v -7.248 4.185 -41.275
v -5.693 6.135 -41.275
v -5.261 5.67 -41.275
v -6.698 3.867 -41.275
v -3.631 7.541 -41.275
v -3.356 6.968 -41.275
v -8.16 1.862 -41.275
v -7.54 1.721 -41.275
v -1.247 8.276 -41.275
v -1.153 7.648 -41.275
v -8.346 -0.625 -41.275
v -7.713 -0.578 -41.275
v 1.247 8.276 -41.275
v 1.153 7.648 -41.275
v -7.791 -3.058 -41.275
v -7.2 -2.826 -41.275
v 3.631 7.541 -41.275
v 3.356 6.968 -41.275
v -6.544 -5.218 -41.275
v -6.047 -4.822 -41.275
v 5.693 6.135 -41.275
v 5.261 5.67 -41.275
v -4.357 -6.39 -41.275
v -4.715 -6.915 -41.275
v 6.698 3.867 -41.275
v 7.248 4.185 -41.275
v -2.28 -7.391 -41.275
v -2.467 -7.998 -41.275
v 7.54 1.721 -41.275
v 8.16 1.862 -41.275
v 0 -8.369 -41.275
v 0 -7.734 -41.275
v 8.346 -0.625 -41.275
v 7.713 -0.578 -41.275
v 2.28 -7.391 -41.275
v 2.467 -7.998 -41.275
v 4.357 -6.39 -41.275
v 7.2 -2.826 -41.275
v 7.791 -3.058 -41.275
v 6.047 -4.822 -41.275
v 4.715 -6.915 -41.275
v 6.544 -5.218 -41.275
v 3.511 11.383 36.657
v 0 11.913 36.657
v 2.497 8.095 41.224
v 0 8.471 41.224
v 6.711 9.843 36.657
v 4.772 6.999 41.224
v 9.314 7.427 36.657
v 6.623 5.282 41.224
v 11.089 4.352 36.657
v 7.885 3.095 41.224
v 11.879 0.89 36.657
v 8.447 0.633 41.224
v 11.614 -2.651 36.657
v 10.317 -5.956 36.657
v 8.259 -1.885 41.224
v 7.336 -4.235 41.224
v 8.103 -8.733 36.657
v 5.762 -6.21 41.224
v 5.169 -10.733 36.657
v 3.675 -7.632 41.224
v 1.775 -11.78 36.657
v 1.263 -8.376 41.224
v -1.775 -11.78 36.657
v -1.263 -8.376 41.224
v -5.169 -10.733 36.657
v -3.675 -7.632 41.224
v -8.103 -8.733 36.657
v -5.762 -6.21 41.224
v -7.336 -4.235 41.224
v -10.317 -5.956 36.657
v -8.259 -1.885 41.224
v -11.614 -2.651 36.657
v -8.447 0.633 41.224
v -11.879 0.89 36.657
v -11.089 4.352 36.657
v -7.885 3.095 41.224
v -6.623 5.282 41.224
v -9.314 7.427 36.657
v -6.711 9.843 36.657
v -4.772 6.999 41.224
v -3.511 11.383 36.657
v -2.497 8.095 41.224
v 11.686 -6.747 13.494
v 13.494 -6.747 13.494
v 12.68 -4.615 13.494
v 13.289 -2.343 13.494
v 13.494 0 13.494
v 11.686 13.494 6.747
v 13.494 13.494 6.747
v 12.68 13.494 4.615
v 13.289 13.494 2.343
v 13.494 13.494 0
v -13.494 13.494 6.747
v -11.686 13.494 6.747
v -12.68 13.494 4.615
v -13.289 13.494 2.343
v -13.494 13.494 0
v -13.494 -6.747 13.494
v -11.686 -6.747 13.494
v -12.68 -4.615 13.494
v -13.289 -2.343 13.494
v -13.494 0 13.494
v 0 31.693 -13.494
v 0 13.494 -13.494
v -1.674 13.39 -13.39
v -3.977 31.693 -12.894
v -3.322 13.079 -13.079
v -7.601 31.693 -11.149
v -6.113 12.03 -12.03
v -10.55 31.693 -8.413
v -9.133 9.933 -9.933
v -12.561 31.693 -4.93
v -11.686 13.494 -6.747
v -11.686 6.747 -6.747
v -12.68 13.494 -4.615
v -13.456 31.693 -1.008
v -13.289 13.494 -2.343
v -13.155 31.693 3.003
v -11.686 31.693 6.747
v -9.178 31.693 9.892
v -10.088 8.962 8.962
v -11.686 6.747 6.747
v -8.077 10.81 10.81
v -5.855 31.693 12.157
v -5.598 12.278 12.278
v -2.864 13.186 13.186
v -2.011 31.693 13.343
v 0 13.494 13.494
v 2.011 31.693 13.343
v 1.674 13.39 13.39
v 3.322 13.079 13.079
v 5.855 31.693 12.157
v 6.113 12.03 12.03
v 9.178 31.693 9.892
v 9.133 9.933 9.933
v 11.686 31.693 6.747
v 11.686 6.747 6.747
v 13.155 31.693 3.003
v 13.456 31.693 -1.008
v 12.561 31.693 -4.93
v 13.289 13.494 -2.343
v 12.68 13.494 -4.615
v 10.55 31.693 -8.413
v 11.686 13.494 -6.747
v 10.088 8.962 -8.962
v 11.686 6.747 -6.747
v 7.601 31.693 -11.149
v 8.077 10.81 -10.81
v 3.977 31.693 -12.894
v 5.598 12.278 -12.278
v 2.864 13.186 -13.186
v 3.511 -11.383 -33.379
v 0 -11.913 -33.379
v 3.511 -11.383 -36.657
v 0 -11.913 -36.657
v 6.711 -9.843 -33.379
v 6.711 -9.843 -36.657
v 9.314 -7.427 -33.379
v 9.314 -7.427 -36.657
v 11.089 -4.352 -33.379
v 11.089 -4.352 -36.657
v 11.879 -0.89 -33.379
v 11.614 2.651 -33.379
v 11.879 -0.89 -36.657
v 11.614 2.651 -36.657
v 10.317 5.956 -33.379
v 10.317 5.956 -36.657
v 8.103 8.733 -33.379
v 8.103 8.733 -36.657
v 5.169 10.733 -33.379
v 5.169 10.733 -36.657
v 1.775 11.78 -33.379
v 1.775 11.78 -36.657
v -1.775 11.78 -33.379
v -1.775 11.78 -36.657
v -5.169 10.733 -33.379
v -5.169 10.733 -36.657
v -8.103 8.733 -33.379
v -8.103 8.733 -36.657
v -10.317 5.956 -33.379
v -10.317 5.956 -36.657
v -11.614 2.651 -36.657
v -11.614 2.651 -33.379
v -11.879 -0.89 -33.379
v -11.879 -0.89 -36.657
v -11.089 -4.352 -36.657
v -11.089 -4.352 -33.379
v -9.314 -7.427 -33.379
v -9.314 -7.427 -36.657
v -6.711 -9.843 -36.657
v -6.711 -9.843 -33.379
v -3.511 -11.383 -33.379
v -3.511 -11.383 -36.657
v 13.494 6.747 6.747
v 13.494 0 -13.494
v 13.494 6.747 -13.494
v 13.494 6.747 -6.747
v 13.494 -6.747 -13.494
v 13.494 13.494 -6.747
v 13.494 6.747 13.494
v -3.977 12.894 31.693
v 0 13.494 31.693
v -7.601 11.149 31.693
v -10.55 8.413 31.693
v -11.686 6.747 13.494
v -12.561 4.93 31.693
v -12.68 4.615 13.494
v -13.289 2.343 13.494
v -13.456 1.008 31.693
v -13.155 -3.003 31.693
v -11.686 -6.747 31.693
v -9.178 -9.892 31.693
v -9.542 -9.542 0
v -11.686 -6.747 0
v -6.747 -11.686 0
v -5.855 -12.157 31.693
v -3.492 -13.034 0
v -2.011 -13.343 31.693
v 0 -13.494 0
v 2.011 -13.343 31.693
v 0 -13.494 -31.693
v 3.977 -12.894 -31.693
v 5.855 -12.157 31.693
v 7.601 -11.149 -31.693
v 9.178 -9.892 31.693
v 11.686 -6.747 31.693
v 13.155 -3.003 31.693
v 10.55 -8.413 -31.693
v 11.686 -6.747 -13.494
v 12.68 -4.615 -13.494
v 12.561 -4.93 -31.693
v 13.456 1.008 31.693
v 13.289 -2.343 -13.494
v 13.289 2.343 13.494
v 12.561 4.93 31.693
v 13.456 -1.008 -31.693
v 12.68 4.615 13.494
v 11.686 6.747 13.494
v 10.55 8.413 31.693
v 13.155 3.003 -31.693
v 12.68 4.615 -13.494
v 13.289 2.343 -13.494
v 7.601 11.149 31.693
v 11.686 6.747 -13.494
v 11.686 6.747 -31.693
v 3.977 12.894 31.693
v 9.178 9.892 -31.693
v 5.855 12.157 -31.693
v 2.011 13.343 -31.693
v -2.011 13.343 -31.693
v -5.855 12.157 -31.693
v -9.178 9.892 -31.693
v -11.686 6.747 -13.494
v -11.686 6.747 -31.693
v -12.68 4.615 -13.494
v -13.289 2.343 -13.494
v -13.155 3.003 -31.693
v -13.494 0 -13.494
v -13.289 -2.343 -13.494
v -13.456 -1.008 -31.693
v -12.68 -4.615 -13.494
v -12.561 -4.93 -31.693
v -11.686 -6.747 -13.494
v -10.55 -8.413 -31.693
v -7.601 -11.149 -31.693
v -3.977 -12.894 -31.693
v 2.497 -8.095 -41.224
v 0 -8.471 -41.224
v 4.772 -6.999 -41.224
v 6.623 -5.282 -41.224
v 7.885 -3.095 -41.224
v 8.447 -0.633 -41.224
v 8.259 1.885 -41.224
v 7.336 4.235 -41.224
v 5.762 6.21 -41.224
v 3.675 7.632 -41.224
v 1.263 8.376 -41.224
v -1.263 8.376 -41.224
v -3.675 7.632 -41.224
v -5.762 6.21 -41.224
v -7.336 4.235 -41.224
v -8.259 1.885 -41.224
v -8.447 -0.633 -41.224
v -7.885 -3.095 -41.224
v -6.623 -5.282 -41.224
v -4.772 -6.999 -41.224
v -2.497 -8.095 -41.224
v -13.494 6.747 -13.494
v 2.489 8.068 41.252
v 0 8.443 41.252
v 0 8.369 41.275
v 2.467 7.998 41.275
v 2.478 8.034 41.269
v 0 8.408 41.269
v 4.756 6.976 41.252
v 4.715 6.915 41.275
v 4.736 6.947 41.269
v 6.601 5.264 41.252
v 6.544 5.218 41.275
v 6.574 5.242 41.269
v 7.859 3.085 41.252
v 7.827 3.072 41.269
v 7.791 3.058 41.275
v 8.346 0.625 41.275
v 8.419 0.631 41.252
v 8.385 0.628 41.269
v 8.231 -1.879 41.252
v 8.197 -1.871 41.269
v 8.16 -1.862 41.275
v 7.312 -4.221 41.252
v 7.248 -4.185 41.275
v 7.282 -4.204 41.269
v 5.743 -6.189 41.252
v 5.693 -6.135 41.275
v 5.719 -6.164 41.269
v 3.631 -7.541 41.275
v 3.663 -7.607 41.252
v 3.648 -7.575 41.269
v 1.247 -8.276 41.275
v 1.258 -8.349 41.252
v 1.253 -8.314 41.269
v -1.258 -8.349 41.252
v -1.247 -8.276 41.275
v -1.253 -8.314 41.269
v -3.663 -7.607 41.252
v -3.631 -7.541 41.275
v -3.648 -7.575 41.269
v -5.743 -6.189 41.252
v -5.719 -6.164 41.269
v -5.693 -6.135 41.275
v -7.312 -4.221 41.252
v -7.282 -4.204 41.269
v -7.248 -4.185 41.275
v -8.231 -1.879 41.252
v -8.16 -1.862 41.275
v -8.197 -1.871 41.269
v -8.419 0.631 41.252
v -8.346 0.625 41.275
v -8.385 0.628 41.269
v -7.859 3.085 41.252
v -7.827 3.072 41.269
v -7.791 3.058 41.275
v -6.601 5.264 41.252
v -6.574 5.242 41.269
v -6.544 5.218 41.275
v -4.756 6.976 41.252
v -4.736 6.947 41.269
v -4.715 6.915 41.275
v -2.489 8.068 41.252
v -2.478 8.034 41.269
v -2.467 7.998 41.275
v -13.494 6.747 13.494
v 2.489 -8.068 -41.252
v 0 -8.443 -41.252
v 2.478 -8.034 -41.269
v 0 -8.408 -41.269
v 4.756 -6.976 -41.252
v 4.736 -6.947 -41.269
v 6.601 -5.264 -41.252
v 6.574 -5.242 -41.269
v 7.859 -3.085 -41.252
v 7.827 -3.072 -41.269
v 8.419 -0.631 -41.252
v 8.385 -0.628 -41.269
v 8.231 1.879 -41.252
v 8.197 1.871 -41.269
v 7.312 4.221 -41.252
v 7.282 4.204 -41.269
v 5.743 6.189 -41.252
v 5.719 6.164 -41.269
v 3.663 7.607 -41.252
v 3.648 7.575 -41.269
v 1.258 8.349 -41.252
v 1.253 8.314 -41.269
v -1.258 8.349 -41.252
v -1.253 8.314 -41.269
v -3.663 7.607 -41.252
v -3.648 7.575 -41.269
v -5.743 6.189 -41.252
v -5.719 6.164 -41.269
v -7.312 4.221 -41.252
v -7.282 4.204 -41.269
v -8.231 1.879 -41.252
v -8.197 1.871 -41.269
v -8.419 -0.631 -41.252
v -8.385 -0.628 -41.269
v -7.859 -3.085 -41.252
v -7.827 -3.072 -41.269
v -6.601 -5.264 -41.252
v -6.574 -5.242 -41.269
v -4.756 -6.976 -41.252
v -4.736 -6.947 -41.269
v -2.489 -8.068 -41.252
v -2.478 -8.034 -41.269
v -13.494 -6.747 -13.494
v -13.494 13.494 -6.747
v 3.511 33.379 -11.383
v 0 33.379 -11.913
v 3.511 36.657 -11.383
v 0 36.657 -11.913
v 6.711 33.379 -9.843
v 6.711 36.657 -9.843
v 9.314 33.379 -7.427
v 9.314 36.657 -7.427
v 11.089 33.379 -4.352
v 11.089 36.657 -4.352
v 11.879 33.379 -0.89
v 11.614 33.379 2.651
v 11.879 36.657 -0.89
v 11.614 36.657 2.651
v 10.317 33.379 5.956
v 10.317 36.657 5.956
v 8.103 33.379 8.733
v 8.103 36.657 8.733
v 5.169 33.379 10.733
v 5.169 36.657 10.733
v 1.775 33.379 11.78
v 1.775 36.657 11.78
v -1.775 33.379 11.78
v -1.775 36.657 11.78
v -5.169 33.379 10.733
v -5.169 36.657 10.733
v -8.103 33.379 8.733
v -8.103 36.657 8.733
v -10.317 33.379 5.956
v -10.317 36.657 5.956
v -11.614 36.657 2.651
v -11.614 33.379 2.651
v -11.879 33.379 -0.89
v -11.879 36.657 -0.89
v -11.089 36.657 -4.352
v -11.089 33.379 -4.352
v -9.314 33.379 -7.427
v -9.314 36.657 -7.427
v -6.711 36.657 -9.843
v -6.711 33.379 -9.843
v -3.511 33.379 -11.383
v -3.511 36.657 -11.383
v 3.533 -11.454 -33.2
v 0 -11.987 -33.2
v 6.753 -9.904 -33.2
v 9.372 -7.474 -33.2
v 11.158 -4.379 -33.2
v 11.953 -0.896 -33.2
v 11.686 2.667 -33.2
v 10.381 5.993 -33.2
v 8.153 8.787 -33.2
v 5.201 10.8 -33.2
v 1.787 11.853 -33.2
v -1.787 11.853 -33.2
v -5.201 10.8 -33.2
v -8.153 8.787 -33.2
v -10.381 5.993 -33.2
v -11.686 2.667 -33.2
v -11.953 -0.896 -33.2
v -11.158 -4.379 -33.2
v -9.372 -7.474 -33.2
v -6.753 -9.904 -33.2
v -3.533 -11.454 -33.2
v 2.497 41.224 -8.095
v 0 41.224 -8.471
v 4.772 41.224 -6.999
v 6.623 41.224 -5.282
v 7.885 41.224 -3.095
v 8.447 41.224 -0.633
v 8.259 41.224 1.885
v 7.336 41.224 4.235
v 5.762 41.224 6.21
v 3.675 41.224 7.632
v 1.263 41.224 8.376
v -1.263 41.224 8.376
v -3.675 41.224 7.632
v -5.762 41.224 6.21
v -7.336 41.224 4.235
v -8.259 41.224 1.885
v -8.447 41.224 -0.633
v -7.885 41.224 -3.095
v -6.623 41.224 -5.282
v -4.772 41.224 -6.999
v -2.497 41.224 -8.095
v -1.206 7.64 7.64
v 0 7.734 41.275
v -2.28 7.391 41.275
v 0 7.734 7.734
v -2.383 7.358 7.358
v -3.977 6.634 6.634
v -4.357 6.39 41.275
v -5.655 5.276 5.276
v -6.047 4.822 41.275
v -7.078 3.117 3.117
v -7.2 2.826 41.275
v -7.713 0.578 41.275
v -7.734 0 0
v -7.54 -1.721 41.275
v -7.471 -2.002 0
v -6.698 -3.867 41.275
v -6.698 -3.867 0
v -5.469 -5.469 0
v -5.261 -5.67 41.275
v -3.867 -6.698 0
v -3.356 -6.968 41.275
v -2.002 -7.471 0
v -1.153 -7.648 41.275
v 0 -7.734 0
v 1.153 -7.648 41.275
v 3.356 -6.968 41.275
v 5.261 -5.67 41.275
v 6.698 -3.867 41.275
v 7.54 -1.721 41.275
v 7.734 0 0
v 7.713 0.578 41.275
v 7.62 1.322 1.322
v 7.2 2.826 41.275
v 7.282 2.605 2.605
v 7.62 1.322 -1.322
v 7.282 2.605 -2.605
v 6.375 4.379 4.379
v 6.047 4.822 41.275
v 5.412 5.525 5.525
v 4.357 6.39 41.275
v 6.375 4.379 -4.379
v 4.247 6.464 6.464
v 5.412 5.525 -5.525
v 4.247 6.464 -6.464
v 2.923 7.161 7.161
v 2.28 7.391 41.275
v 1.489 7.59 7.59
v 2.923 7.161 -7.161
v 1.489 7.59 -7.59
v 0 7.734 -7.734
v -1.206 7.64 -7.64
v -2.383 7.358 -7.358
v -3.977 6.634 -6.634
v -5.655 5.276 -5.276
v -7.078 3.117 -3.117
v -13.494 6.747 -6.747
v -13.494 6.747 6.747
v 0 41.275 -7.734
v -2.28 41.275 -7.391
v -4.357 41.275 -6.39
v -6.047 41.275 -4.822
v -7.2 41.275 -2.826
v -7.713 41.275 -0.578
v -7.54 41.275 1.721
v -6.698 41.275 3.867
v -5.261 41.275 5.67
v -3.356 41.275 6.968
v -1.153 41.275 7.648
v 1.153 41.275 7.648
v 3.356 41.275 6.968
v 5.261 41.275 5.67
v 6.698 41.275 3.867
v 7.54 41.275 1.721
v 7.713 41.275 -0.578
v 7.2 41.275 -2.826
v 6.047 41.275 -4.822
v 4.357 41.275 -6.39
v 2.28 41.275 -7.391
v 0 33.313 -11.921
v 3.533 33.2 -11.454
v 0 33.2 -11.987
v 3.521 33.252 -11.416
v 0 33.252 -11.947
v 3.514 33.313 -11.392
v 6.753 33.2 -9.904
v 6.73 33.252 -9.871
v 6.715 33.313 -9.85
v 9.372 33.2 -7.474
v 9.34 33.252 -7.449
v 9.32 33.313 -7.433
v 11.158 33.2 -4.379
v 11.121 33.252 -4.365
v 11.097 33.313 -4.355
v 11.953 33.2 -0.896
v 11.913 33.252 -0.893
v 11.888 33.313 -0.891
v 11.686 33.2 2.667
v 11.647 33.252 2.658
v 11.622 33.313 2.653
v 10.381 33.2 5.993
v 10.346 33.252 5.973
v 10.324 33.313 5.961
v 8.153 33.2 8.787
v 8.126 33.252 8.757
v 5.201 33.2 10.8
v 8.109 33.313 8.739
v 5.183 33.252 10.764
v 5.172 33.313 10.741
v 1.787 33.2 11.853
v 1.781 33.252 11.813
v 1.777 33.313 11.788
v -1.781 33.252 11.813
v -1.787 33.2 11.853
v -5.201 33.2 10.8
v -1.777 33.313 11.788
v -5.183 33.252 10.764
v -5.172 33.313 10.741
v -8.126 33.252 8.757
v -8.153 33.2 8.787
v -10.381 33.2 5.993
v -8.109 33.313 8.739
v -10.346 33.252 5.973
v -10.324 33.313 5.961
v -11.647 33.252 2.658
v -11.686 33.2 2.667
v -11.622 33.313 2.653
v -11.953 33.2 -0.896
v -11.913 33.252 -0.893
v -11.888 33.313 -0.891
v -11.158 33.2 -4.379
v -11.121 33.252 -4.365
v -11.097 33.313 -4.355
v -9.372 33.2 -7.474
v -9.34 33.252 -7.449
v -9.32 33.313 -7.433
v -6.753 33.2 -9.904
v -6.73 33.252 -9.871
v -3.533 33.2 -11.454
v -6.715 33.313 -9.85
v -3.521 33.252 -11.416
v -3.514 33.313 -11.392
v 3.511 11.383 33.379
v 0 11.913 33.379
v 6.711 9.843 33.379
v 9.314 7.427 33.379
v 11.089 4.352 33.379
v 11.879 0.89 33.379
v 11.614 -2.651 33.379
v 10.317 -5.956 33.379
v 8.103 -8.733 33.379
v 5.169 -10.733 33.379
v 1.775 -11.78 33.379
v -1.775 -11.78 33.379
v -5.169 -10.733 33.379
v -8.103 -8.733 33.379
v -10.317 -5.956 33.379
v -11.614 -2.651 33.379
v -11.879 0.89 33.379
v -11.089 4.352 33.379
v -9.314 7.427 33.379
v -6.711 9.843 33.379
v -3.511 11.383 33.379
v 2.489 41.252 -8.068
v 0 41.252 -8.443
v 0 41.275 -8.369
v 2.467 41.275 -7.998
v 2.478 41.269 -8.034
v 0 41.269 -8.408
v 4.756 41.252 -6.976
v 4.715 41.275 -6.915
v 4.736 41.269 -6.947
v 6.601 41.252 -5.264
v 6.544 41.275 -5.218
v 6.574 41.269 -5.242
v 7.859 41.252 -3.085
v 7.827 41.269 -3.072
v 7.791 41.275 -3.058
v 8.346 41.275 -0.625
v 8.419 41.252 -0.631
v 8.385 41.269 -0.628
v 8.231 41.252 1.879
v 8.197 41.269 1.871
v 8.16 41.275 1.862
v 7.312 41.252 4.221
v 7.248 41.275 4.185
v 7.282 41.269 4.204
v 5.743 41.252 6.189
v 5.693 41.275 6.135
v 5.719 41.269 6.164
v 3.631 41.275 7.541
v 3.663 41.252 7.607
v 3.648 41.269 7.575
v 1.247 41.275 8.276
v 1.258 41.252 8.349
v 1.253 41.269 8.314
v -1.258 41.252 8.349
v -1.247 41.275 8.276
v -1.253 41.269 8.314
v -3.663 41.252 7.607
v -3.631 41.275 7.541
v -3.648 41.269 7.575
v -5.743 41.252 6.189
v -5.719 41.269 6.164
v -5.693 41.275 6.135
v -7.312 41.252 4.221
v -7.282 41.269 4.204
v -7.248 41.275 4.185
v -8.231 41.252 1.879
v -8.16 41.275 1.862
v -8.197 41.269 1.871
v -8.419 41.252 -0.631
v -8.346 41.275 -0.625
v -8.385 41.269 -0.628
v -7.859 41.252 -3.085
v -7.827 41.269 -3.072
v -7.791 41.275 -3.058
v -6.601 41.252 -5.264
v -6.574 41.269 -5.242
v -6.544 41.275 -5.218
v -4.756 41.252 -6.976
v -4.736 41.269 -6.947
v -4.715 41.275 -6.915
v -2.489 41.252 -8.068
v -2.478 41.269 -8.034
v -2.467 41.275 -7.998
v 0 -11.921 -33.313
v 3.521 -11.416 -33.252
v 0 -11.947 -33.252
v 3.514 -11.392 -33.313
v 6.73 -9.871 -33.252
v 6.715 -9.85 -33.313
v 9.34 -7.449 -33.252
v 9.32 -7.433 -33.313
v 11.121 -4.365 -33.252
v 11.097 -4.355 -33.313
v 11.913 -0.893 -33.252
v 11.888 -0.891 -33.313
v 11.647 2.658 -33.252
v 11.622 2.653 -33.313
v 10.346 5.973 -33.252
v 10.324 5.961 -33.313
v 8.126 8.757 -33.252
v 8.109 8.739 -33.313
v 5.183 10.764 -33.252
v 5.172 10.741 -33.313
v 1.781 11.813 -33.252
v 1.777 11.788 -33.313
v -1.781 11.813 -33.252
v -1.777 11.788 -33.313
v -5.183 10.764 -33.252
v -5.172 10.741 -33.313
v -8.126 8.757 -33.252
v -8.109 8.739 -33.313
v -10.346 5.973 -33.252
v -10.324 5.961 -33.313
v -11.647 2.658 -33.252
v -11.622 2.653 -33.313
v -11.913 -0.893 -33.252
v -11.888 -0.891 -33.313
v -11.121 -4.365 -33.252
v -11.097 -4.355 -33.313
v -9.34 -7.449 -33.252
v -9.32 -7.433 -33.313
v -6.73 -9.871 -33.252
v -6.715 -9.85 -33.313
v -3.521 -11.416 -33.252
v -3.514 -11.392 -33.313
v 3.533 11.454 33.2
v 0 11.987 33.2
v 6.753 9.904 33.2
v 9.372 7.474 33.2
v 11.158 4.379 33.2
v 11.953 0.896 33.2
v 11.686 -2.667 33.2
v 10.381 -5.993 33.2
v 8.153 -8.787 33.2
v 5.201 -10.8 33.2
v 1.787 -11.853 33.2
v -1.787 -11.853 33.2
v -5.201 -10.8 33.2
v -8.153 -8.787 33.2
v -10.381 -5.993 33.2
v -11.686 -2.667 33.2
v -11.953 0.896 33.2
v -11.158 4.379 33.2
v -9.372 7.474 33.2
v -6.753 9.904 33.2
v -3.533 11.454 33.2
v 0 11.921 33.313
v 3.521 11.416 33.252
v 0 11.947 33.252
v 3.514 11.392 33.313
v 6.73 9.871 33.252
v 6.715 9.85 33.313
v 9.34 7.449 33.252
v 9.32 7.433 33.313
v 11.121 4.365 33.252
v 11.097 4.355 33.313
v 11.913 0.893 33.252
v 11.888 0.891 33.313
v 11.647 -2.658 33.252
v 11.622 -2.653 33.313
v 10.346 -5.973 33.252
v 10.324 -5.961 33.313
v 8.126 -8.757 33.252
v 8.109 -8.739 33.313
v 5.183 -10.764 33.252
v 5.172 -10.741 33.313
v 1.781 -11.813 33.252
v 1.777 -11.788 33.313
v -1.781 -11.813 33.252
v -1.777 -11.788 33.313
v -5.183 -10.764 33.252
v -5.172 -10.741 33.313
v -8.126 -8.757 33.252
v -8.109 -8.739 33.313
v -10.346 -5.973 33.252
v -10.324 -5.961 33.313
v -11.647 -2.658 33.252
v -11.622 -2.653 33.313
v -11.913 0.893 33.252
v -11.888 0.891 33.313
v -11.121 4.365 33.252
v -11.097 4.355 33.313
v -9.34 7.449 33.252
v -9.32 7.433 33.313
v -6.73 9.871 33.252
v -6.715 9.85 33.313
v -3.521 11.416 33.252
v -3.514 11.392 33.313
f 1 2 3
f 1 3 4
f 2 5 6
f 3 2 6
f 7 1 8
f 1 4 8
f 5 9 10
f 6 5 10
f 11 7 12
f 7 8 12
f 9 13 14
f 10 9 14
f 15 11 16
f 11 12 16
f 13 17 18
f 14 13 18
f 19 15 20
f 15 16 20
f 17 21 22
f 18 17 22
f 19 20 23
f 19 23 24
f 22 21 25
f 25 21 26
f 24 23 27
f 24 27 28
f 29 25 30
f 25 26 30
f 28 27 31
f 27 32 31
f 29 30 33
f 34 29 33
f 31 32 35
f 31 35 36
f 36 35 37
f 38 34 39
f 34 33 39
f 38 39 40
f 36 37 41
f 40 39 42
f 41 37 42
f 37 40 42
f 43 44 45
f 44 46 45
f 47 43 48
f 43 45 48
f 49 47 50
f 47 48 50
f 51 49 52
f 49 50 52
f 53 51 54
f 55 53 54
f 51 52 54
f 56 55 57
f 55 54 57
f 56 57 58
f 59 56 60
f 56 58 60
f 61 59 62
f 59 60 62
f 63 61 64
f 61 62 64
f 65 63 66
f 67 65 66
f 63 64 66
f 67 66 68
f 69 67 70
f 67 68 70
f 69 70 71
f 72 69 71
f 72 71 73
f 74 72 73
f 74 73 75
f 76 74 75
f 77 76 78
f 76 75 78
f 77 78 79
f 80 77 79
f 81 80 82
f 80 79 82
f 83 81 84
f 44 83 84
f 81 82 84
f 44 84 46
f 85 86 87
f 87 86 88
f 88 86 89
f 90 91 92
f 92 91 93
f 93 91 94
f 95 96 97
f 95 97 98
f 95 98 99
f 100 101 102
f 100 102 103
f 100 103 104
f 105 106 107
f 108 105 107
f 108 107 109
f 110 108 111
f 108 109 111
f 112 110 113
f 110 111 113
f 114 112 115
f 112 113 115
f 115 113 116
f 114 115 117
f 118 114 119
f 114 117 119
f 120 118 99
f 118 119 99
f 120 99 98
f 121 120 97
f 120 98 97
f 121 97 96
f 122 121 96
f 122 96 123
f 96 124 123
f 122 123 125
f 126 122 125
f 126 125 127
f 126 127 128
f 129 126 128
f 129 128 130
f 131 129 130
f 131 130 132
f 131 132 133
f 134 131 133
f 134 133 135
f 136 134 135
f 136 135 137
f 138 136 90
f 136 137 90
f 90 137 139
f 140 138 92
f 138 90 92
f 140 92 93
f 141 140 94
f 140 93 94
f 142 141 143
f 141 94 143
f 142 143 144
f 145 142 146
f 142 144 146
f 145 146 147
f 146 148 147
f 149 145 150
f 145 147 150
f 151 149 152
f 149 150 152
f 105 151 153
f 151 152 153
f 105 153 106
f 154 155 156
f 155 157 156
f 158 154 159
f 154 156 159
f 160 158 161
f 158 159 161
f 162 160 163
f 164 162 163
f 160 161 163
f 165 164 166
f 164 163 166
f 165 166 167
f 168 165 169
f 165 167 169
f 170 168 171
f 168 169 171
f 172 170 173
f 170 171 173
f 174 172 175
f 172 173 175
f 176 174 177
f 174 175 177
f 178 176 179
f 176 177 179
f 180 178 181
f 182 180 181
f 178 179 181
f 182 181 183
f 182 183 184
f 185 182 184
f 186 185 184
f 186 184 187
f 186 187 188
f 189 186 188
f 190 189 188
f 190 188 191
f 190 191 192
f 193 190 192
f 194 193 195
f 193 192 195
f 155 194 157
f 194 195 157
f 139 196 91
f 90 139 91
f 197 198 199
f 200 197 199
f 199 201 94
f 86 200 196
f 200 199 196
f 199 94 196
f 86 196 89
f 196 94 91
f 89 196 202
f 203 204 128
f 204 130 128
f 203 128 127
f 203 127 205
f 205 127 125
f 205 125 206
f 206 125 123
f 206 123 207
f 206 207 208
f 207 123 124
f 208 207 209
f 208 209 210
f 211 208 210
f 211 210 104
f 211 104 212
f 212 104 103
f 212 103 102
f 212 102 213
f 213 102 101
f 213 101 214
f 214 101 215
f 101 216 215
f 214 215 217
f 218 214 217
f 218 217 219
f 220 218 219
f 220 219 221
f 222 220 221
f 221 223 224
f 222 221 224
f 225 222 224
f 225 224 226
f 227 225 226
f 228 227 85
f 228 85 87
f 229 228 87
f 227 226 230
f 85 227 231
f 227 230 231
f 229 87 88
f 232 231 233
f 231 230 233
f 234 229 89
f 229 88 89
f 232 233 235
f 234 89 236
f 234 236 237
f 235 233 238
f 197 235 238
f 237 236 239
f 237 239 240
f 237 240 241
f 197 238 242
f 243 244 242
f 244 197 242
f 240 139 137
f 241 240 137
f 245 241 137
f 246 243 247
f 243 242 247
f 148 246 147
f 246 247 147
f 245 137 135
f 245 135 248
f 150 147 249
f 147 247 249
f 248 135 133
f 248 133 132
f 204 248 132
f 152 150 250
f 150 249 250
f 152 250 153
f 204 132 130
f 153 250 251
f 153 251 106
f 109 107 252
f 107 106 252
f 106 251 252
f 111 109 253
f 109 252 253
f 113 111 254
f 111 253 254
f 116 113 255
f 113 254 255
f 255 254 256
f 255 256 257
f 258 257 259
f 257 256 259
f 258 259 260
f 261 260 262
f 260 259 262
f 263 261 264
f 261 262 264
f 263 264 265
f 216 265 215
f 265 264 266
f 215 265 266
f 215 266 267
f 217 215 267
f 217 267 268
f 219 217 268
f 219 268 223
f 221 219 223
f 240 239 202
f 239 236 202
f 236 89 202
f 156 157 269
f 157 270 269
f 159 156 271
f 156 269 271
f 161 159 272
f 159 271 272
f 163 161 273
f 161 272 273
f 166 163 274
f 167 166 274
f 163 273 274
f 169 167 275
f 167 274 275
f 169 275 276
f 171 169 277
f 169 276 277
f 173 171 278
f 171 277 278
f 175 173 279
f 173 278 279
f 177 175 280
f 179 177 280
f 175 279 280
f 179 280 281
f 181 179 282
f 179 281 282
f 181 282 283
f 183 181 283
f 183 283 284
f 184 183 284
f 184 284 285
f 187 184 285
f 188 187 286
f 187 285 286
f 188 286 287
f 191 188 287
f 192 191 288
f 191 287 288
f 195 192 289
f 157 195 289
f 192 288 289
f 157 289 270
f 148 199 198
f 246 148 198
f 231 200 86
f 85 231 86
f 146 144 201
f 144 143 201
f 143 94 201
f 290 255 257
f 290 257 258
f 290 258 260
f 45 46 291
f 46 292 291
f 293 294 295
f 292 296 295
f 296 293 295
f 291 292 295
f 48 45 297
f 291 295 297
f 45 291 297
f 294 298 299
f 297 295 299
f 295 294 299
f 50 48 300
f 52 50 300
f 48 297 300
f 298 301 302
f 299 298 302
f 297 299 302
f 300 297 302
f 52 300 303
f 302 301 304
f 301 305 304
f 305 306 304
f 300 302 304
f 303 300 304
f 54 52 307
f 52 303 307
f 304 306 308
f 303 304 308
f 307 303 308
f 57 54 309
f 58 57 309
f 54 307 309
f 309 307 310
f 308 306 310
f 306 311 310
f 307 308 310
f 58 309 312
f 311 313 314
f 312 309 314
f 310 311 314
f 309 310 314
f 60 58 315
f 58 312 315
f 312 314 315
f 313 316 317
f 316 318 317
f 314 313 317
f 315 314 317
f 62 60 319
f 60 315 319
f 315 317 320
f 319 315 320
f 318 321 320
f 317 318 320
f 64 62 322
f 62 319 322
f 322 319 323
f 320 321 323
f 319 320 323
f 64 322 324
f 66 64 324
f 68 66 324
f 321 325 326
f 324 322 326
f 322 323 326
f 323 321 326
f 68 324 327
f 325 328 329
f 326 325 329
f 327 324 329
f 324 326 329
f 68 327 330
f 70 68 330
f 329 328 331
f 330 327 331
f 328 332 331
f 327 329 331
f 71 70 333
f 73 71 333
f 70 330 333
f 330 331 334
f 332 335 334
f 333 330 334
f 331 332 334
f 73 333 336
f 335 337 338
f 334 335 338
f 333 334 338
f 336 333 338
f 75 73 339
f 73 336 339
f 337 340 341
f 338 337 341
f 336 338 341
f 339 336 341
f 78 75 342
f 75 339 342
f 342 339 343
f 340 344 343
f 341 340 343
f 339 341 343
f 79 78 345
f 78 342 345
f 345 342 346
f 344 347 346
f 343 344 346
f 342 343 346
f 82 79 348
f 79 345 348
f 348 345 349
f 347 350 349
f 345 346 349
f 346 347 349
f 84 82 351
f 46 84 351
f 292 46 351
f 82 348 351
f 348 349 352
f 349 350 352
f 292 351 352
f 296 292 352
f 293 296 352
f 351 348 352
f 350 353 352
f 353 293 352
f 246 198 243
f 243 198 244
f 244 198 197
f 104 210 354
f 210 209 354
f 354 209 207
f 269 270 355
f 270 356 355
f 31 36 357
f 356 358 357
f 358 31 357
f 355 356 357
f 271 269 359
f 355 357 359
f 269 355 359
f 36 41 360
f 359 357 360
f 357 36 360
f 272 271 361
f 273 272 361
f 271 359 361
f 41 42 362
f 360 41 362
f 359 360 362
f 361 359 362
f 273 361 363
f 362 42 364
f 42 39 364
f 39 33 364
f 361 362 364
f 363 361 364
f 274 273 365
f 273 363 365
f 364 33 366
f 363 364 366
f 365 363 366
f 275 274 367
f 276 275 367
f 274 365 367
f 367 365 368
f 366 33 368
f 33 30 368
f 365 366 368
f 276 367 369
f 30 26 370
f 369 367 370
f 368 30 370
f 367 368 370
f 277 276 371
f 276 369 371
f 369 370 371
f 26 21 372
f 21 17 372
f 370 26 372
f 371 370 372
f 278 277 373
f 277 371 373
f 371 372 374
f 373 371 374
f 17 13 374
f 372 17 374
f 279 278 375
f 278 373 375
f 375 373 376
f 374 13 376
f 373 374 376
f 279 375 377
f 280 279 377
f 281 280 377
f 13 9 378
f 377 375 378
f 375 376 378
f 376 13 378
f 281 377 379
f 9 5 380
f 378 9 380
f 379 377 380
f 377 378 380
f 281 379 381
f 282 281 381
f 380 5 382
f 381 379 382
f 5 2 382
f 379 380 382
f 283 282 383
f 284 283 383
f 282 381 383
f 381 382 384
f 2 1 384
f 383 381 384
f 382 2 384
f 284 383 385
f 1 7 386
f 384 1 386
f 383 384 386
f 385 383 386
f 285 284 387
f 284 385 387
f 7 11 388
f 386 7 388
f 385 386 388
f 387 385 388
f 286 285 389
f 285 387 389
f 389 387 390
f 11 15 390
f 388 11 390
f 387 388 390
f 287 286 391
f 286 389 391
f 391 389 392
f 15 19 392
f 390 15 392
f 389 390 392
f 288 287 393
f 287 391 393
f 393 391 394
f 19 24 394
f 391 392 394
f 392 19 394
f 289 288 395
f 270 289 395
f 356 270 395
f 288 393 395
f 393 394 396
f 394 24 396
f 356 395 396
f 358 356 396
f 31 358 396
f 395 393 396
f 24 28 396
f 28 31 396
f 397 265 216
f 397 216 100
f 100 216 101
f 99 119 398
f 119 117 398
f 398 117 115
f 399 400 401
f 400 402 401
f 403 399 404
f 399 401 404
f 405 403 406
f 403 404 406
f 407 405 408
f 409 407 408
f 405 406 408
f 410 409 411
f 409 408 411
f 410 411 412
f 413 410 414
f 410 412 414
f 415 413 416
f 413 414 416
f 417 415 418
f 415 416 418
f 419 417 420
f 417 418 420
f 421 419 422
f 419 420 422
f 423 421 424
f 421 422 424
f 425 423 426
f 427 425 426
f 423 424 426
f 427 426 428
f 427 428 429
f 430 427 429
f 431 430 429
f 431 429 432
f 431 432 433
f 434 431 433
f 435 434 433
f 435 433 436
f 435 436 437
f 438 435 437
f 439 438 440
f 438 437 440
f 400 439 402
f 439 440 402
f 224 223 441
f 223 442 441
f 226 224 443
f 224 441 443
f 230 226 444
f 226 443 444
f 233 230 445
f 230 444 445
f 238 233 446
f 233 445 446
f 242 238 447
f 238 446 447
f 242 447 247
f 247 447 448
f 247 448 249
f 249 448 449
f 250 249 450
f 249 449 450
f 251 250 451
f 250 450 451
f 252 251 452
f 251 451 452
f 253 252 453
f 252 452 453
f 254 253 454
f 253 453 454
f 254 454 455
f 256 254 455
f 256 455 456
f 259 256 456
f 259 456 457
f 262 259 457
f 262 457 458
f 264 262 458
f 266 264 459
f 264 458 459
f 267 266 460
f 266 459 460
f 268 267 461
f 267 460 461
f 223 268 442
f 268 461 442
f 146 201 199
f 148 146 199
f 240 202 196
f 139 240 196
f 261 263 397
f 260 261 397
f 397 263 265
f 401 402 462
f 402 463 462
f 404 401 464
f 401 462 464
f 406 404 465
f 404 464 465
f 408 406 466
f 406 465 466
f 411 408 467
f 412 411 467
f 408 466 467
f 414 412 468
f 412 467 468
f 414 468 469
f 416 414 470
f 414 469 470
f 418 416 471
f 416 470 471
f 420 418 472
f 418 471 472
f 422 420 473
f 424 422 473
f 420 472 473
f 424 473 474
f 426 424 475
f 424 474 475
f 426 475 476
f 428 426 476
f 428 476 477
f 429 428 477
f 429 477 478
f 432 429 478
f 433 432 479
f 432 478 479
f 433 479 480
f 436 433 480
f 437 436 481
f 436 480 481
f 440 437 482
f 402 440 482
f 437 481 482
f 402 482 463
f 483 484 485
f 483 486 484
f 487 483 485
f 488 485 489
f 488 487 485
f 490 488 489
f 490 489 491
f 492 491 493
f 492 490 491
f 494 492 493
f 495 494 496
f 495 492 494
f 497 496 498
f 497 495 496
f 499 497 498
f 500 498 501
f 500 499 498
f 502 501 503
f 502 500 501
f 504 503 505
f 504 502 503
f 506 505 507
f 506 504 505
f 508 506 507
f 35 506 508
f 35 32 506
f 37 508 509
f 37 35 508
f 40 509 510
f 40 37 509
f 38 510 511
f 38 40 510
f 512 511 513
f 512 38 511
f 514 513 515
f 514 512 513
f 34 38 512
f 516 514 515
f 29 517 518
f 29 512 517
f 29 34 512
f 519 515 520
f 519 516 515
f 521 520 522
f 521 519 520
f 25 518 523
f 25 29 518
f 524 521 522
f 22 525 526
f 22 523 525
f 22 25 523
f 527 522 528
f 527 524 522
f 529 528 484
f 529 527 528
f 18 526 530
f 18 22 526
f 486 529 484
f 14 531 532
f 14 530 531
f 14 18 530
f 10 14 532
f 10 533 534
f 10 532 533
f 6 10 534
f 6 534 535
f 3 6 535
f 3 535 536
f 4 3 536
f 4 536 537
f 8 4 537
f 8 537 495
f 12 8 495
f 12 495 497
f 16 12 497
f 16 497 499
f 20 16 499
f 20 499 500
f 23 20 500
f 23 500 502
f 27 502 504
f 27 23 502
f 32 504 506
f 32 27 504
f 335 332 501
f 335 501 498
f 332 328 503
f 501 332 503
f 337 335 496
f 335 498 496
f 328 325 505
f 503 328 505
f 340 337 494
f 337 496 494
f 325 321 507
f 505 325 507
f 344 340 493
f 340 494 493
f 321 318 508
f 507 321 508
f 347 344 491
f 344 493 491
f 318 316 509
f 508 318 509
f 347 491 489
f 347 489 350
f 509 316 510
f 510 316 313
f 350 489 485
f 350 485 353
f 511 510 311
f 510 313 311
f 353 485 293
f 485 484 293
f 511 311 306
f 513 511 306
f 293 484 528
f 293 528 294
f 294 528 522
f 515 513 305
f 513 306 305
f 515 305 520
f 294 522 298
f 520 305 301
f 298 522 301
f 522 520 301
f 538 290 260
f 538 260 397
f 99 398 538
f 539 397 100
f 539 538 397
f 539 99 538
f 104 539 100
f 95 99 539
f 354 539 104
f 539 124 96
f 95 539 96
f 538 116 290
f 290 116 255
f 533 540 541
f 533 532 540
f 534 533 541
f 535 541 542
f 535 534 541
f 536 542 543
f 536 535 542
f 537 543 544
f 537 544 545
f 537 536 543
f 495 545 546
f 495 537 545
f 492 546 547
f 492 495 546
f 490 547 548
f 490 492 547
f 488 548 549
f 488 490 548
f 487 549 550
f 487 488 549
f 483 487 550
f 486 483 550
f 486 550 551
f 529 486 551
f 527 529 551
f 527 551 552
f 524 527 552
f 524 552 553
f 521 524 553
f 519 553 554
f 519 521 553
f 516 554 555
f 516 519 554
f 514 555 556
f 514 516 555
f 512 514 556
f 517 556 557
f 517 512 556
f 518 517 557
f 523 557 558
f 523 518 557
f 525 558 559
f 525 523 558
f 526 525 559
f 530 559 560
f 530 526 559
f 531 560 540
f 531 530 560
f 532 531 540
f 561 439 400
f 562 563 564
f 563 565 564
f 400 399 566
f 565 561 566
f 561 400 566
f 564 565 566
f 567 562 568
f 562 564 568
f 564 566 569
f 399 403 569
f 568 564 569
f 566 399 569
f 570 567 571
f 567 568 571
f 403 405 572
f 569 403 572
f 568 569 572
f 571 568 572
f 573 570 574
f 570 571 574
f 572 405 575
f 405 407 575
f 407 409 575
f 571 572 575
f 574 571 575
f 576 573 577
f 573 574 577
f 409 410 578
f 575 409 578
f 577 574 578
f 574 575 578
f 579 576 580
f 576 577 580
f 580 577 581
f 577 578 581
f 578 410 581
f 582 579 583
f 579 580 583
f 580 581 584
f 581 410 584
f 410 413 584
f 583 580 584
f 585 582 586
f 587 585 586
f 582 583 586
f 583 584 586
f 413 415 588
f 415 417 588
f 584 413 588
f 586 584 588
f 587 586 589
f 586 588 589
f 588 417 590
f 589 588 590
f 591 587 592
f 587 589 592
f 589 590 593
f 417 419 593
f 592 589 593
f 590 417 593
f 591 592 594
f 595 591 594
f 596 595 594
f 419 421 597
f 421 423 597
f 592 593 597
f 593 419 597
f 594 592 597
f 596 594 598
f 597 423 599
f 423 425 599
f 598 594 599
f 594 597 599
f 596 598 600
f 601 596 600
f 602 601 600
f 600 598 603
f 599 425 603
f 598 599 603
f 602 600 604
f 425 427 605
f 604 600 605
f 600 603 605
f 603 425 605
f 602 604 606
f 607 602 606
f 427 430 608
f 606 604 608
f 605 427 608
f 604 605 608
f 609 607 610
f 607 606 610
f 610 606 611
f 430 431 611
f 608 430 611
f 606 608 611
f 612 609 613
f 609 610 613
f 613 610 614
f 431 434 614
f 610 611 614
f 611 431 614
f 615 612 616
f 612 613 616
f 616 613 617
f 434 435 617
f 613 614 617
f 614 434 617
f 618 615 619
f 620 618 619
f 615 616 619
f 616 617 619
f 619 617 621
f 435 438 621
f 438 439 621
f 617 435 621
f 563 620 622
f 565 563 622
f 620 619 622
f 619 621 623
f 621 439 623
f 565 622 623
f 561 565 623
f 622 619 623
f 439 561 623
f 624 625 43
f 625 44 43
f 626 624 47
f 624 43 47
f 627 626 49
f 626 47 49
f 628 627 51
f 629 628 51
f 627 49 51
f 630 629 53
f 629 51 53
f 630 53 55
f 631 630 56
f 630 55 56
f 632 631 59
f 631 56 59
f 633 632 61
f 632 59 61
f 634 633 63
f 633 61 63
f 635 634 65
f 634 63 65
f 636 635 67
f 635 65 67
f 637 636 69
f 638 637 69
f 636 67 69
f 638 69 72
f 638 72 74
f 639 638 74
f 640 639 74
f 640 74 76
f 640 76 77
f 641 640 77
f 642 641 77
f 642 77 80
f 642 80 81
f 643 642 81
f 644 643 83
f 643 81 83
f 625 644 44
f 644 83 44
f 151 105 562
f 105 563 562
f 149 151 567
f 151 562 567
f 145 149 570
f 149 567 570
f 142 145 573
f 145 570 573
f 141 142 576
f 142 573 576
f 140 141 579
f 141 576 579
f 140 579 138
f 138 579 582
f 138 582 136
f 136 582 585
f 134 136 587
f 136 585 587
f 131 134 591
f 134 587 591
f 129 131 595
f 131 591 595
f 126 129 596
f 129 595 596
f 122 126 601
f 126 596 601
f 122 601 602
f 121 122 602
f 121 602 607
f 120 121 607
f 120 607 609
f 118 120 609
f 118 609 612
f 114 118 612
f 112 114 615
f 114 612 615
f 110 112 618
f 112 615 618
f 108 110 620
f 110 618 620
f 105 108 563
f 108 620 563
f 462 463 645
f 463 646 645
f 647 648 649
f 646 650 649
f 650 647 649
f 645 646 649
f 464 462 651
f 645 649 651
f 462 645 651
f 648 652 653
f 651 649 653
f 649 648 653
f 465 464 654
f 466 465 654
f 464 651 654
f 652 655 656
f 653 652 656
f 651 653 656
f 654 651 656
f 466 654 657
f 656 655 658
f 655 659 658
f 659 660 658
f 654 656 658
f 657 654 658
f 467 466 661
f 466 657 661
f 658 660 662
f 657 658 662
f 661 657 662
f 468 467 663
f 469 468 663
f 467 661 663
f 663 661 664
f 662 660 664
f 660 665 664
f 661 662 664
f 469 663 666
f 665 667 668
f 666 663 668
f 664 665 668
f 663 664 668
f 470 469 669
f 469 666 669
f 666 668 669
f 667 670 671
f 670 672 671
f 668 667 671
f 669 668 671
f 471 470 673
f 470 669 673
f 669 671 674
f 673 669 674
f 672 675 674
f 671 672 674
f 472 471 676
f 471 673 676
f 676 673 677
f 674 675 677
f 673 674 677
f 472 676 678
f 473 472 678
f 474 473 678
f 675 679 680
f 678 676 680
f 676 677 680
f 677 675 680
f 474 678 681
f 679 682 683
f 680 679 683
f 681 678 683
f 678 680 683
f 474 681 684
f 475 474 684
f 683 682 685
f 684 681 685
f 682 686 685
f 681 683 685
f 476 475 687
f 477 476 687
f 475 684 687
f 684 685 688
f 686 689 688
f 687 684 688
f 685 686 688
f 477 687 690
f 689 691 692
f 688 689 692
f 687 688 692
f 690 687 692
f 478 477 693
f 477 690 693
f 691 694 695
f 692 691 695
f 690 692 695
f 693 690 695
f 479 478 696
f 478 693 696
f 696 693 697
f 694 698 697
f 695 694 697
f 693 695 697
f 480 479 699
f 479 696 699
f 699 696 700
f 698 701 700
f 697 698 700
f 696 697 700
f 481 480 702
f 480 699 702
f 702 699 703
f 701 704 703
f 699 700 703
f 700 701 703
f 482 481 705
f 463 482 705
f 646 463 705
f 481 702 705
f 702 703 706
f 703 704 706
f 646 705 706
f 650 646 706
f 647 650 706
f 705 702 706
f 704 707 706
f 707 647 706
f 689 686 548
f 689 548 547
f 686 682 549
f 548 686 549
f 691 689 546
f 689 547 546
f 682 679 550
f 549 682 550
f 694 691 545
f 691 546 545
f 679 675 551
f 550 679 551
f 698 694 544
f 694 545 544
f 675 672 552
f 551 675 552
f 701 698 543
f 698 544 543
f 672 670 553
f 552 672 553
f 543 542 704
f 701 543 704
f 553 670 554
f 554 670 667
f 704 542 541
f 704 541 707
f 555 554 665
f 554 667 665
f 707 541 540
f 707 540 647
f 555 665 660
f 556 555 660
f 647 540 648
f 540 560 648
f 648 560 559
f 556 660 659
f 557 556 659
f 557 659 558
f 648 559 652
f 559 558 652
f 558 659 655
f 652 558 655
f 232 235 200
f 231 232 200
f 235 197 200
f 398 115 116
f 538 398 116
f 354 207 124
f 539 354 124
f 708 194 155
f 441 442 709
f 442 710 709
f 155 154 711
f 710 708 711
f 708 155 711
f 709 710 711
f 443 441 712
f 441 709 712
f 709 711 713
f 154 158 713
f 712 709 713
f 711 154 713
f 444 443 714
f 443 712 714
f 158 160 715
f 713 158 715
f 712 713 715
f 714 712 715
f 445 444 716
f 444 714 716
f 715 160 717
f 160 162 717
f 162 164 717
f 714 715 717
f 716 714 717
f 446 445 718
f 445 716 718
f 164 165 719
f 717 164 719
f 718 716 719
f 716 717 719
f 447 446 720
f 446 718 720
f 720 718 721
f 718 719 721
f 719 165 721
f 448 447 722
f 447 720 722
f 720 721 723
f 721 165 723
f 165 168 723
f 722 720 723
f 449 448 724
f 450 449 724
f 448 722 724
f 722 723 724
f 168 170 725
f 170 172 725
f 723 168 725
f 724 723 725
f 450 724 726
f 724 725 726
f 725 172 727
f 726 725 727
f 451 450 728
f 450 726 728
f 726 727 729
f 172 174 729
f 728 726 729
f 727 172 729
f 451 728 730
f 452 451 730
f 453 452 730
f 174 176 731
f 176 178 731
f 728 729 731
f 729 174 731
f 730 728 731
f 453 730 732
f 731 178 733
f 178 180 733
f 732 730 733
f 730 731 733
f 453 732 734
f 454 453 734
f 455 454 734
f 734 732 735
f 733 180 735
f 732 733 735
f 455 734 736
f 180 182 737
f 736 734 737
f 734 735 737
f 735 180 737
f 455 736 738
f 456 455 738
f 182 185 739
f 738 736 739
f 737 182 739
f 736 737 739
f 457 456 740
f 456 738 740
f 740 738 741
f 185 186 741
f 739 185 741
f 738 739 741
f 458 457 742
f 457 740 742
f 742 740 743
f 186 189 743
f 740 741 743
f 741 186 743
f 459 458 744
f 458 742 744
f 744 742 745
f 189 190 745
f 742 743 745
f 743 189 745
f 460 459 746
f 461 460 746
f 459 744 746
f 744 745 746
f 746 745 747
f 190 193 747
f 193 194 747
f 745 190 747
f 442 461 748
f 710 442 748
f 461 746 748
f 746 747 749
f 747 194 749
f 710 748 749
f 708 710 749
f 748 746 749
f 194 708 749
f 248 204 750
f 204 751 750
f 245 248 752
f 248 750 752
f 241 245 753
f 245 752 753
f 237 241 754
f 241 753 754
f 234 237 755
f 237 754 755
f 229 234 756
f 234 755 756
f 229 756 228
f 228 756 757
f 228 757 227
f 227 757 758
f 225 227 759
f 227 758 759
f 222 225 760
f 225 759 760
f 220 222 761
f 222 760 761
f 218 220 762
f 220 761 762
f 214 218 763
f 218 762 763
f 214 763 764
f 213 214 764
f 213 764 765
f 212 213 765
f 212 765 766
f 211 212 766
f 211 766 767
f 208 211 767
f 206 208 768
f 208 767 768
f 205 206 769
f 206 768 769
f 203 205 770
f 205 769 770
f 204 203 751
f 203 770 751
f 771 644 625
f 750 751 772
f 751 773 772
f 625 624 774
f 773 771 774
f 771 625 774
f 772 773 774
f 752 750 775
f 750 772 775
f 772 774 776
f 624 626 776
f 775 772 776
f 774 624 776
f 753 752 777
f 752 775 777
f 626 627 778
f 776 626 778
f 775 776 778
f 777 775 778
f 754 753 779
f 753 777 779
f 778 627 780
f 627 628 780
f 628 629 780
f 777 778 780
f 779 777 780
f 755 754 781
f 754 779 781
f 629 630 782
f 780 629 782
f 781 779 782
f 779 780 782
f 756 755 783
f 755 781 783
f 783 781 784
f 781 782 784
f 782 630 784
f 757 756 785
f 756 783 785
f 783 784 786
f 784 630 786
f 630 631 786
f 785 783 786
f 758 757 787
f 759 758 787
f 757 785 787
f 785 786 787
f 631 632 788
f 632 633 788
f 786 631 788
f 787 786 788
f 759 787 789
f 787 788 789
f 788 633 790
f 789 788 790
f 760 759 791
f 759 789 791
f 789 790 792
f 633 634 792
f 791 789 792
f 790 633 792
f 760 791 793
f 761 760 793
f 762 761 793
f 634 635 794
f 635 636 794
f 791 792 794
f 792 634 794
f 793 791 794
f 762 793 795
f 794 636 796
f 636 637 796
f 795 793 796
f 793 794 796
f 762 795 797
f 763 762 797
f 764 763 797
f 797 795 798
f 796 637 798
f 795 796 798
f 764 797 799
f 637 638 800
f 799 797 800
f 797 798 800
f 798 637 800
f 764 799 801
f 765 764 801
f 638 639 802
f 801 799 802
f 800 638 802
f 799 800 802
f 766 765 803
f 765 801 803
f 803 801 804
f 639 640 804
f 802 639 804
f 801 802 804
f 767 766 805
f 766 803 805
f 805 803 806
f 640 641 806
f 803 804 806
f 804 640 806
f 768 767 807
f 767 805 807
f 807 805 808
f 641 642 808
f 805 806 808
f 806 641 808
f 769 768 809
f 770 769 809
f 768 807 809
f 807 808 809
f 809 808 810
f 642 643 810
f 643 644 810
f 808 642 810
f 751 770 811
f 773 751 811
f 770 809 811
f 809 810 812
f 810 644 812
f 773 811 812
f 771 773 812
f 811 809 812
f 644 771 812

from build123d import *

# Parameters (mm, degrees)
SKETCH4_W           = 19.3294
SKETCH4_H           = 13.49375
CIRPATTERN1_COUNT   = 3
CIRPATTERN1_ANGLE   = 180
BOSS_EXTRUDE1_DEPTH = 13.49375
CIRPATTERN2_COUNT   = 3
CIRPATTERN2_ANGLE   = 180


with BuildPart() as part:
    # Sketch1 → Revolve1 (revolve)
    with BuildSketch(Plane(origin=(0, 0, 0), x_dir=(0, 0, -1), z_dir=(1, 0, 0))):
        with BuildLine():
            Line((-41.275, 0), (-19.3294, 0))
            Line((-19.3294, 0), (-19.3294, 12.0015))
            Line((-19.3294, 12.0015), (-19.3294, 13.49375))
            Line((-19.3294, 13.49375), (-23.99665, 13.49375))
            Line((-23.99665, 13.49375), (-31.69285, 13.49375))
            Line((-31.69285, 13.49375), (-33.199605122, 11.986994878))
            ThreePointArc((-33.199605122, 11.986994878), (-33.282008653, 11.931934599), (-33.379210245, 11.9126))
            Line((-33.379210245, 11.9126), (-36.65714943, 11.9126))
            Line((-36.65714943, 11.9126), (-41.224430508, 8.470906846))
            ThreePointArc((-41.224430508, 8.470906846), (-41.261656664, 8.426147258), (-41.275, 8.369480136))
            Line((-41.275, 8.369480136), (-41.275, 0))
        make_face()
    revolve(axis=Axis((0, 0, 19.812), (0, 0, -1)))

    # Sketch4 → Revolve2 (revolve)
    with BuildSketch(Plane(origin=(0, 0, 0), x_dir=(0, 0, -1), z_dir=(1, 0, 0))):
        with Locations((-9.6647, 6.746875)):
            Rectangle(SKETCH4_W, SKETCH4_H)
    revolve(axis=Axis((0, 0, 0), (0, 0, 1)))


with BuildPart() as cirpattern1_1:
    # CirPattern1: pattern copy
    add(part.part.rotate(Axis((-10.773895932, 0, 0), (-1, 0, 0)), 1 * CIRPATTERN1_ANGLE / (CIRPATTERN1_COUNT - 1)))


with BuildPart() as cirpattern1_2:
    # CirPattern1: pattern copy
    add(part.part.rotate(Axis((-10.773895932, 0, 0), (-1, 0, 0)), 2 * CIRPATTERN1_ANGLE / (CIRPATTERN1_COUNT - 1)))


with BuildPart() as cirpattern1_1_1:
    add(cirpattern1_1.part)

    # Combine1: union CirPattern1_2, part
    add(cirpattern1_2.part)
    add(part.part)

    # Sketch5 → Boss-Extrude1 (add, symmetric)
    with BuildSketch(Plane(origin=(0, 0, 0), x_dir=(0, 0, -1), z_dir=(1, 0, 0))):
        Polygon((-6.746875, 13.49375), (6.746875, 13.49375), (6.746875, 6.746875), (13.49375, 6.746875), (13.49375, -6.746875), (-13.49375, -6.746875), (-13.49375, 6.746875), (-6.746875, 6.746875), align=None)
    extrude(amount=BOSS_EXTRUDE1_DEPTH, both=True)

    # Sketch6 → Cut-Revolve1 (revolve, cut)
    with BuildSketch(Plane(origin=(0, 0, 0), x_dir=(0, 0, -1), z_dir=(1, 0, 0))):
        with BuildLine():
            Line((-41.275, 7.7343), (0, 7.7343))
            ThreePointArc((0, 7.7343), (5.468975978, 5.468975978), (7.7343, 0))
            Line((7.7343, 0), (-41.275, 0))
            Line((-41.275, 0), (-41.275, 7.7343))
        make_face()
    cut_revolve1 = revolve(axis=Axis((0, 0, -7.7343), (0, 0, 1)), mode=Mode.SUBTRACT)

    # CirPattern2: Cut-Revolve1 ×3 about axis
    cirpattern2_axis = Axis((-10.773895932, 0, 0), (-1, 0, 0))
    for i in range(1, CIRPATTERN2_COUNT):
        add(cut_revolve1.rotate(cirpattern2_axis, i * CIRPATTERN2_ANGLE / (CIRPATTERN2_COUNT - 1)), mode=Mode.SUBTRACT)


solid = cirpattern1_1_1.part
